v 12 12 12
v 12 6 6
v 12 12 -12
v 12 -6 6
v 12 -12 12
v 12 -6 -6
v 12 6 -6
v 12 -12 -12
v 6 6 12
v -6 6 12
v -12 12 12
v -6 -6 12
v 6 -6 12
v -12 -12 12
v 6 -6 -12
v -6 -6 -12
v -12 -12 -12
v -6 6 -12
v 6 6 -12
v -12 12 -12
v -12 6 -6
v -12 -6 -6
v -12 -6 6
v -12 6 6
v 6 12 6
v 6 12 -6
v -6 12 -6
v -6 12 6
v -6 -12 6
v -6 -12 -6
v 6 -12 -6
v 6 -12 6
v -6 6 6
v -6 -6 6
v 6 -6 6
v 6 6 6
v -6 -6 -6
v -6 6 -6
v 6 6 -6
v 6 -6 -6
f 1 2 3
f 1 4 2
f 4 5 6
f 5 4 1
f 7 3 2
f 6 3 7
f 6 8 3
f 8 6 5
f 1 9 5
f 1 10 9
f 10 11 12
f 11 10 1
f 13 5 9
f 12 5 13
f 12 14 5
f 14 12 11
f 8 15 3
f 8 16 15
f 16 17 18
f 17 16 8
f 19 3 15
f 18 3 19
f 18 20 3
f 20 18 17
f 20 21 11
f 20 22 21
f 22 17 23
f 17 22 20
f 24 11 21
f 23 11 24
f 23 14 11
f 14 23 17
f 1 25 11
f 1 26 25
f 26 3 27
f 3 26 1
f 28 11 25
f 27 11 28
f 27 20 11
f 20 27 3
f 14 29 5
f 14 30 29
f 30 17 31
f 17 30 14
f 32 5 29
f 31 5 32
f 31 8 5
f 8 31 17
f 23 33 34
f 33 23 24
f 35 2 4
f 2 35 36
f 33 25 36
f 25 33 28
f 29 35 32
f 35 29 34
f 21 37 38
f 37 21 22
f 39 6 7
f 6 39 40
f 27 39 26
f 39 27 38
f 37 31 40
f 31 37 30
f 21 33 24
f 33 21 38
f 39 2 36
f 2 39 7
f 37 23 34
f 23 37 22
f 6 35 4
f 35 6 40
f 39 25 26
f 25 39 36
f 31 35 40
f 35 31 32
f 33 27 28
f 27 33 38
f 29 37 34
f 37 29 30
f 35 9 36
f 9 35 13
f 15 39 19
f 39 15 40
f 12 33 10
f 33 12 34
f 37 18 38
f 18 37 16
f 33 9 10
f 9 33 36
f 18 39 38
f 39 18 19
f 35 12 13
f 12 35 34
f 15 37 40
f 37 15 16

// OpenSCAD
// Three centered square tunnels intersect along the cube's principal axes.
side = 24;
opening = side / 2;

color("#168fe5")
difference() {
    cube(side, center=true);
    cube([side * 2, opening, opening], center=true);
    cube([opening, side * 2, opening], center=true);
    cube([opening, opening, side * 2], center=true);
}
